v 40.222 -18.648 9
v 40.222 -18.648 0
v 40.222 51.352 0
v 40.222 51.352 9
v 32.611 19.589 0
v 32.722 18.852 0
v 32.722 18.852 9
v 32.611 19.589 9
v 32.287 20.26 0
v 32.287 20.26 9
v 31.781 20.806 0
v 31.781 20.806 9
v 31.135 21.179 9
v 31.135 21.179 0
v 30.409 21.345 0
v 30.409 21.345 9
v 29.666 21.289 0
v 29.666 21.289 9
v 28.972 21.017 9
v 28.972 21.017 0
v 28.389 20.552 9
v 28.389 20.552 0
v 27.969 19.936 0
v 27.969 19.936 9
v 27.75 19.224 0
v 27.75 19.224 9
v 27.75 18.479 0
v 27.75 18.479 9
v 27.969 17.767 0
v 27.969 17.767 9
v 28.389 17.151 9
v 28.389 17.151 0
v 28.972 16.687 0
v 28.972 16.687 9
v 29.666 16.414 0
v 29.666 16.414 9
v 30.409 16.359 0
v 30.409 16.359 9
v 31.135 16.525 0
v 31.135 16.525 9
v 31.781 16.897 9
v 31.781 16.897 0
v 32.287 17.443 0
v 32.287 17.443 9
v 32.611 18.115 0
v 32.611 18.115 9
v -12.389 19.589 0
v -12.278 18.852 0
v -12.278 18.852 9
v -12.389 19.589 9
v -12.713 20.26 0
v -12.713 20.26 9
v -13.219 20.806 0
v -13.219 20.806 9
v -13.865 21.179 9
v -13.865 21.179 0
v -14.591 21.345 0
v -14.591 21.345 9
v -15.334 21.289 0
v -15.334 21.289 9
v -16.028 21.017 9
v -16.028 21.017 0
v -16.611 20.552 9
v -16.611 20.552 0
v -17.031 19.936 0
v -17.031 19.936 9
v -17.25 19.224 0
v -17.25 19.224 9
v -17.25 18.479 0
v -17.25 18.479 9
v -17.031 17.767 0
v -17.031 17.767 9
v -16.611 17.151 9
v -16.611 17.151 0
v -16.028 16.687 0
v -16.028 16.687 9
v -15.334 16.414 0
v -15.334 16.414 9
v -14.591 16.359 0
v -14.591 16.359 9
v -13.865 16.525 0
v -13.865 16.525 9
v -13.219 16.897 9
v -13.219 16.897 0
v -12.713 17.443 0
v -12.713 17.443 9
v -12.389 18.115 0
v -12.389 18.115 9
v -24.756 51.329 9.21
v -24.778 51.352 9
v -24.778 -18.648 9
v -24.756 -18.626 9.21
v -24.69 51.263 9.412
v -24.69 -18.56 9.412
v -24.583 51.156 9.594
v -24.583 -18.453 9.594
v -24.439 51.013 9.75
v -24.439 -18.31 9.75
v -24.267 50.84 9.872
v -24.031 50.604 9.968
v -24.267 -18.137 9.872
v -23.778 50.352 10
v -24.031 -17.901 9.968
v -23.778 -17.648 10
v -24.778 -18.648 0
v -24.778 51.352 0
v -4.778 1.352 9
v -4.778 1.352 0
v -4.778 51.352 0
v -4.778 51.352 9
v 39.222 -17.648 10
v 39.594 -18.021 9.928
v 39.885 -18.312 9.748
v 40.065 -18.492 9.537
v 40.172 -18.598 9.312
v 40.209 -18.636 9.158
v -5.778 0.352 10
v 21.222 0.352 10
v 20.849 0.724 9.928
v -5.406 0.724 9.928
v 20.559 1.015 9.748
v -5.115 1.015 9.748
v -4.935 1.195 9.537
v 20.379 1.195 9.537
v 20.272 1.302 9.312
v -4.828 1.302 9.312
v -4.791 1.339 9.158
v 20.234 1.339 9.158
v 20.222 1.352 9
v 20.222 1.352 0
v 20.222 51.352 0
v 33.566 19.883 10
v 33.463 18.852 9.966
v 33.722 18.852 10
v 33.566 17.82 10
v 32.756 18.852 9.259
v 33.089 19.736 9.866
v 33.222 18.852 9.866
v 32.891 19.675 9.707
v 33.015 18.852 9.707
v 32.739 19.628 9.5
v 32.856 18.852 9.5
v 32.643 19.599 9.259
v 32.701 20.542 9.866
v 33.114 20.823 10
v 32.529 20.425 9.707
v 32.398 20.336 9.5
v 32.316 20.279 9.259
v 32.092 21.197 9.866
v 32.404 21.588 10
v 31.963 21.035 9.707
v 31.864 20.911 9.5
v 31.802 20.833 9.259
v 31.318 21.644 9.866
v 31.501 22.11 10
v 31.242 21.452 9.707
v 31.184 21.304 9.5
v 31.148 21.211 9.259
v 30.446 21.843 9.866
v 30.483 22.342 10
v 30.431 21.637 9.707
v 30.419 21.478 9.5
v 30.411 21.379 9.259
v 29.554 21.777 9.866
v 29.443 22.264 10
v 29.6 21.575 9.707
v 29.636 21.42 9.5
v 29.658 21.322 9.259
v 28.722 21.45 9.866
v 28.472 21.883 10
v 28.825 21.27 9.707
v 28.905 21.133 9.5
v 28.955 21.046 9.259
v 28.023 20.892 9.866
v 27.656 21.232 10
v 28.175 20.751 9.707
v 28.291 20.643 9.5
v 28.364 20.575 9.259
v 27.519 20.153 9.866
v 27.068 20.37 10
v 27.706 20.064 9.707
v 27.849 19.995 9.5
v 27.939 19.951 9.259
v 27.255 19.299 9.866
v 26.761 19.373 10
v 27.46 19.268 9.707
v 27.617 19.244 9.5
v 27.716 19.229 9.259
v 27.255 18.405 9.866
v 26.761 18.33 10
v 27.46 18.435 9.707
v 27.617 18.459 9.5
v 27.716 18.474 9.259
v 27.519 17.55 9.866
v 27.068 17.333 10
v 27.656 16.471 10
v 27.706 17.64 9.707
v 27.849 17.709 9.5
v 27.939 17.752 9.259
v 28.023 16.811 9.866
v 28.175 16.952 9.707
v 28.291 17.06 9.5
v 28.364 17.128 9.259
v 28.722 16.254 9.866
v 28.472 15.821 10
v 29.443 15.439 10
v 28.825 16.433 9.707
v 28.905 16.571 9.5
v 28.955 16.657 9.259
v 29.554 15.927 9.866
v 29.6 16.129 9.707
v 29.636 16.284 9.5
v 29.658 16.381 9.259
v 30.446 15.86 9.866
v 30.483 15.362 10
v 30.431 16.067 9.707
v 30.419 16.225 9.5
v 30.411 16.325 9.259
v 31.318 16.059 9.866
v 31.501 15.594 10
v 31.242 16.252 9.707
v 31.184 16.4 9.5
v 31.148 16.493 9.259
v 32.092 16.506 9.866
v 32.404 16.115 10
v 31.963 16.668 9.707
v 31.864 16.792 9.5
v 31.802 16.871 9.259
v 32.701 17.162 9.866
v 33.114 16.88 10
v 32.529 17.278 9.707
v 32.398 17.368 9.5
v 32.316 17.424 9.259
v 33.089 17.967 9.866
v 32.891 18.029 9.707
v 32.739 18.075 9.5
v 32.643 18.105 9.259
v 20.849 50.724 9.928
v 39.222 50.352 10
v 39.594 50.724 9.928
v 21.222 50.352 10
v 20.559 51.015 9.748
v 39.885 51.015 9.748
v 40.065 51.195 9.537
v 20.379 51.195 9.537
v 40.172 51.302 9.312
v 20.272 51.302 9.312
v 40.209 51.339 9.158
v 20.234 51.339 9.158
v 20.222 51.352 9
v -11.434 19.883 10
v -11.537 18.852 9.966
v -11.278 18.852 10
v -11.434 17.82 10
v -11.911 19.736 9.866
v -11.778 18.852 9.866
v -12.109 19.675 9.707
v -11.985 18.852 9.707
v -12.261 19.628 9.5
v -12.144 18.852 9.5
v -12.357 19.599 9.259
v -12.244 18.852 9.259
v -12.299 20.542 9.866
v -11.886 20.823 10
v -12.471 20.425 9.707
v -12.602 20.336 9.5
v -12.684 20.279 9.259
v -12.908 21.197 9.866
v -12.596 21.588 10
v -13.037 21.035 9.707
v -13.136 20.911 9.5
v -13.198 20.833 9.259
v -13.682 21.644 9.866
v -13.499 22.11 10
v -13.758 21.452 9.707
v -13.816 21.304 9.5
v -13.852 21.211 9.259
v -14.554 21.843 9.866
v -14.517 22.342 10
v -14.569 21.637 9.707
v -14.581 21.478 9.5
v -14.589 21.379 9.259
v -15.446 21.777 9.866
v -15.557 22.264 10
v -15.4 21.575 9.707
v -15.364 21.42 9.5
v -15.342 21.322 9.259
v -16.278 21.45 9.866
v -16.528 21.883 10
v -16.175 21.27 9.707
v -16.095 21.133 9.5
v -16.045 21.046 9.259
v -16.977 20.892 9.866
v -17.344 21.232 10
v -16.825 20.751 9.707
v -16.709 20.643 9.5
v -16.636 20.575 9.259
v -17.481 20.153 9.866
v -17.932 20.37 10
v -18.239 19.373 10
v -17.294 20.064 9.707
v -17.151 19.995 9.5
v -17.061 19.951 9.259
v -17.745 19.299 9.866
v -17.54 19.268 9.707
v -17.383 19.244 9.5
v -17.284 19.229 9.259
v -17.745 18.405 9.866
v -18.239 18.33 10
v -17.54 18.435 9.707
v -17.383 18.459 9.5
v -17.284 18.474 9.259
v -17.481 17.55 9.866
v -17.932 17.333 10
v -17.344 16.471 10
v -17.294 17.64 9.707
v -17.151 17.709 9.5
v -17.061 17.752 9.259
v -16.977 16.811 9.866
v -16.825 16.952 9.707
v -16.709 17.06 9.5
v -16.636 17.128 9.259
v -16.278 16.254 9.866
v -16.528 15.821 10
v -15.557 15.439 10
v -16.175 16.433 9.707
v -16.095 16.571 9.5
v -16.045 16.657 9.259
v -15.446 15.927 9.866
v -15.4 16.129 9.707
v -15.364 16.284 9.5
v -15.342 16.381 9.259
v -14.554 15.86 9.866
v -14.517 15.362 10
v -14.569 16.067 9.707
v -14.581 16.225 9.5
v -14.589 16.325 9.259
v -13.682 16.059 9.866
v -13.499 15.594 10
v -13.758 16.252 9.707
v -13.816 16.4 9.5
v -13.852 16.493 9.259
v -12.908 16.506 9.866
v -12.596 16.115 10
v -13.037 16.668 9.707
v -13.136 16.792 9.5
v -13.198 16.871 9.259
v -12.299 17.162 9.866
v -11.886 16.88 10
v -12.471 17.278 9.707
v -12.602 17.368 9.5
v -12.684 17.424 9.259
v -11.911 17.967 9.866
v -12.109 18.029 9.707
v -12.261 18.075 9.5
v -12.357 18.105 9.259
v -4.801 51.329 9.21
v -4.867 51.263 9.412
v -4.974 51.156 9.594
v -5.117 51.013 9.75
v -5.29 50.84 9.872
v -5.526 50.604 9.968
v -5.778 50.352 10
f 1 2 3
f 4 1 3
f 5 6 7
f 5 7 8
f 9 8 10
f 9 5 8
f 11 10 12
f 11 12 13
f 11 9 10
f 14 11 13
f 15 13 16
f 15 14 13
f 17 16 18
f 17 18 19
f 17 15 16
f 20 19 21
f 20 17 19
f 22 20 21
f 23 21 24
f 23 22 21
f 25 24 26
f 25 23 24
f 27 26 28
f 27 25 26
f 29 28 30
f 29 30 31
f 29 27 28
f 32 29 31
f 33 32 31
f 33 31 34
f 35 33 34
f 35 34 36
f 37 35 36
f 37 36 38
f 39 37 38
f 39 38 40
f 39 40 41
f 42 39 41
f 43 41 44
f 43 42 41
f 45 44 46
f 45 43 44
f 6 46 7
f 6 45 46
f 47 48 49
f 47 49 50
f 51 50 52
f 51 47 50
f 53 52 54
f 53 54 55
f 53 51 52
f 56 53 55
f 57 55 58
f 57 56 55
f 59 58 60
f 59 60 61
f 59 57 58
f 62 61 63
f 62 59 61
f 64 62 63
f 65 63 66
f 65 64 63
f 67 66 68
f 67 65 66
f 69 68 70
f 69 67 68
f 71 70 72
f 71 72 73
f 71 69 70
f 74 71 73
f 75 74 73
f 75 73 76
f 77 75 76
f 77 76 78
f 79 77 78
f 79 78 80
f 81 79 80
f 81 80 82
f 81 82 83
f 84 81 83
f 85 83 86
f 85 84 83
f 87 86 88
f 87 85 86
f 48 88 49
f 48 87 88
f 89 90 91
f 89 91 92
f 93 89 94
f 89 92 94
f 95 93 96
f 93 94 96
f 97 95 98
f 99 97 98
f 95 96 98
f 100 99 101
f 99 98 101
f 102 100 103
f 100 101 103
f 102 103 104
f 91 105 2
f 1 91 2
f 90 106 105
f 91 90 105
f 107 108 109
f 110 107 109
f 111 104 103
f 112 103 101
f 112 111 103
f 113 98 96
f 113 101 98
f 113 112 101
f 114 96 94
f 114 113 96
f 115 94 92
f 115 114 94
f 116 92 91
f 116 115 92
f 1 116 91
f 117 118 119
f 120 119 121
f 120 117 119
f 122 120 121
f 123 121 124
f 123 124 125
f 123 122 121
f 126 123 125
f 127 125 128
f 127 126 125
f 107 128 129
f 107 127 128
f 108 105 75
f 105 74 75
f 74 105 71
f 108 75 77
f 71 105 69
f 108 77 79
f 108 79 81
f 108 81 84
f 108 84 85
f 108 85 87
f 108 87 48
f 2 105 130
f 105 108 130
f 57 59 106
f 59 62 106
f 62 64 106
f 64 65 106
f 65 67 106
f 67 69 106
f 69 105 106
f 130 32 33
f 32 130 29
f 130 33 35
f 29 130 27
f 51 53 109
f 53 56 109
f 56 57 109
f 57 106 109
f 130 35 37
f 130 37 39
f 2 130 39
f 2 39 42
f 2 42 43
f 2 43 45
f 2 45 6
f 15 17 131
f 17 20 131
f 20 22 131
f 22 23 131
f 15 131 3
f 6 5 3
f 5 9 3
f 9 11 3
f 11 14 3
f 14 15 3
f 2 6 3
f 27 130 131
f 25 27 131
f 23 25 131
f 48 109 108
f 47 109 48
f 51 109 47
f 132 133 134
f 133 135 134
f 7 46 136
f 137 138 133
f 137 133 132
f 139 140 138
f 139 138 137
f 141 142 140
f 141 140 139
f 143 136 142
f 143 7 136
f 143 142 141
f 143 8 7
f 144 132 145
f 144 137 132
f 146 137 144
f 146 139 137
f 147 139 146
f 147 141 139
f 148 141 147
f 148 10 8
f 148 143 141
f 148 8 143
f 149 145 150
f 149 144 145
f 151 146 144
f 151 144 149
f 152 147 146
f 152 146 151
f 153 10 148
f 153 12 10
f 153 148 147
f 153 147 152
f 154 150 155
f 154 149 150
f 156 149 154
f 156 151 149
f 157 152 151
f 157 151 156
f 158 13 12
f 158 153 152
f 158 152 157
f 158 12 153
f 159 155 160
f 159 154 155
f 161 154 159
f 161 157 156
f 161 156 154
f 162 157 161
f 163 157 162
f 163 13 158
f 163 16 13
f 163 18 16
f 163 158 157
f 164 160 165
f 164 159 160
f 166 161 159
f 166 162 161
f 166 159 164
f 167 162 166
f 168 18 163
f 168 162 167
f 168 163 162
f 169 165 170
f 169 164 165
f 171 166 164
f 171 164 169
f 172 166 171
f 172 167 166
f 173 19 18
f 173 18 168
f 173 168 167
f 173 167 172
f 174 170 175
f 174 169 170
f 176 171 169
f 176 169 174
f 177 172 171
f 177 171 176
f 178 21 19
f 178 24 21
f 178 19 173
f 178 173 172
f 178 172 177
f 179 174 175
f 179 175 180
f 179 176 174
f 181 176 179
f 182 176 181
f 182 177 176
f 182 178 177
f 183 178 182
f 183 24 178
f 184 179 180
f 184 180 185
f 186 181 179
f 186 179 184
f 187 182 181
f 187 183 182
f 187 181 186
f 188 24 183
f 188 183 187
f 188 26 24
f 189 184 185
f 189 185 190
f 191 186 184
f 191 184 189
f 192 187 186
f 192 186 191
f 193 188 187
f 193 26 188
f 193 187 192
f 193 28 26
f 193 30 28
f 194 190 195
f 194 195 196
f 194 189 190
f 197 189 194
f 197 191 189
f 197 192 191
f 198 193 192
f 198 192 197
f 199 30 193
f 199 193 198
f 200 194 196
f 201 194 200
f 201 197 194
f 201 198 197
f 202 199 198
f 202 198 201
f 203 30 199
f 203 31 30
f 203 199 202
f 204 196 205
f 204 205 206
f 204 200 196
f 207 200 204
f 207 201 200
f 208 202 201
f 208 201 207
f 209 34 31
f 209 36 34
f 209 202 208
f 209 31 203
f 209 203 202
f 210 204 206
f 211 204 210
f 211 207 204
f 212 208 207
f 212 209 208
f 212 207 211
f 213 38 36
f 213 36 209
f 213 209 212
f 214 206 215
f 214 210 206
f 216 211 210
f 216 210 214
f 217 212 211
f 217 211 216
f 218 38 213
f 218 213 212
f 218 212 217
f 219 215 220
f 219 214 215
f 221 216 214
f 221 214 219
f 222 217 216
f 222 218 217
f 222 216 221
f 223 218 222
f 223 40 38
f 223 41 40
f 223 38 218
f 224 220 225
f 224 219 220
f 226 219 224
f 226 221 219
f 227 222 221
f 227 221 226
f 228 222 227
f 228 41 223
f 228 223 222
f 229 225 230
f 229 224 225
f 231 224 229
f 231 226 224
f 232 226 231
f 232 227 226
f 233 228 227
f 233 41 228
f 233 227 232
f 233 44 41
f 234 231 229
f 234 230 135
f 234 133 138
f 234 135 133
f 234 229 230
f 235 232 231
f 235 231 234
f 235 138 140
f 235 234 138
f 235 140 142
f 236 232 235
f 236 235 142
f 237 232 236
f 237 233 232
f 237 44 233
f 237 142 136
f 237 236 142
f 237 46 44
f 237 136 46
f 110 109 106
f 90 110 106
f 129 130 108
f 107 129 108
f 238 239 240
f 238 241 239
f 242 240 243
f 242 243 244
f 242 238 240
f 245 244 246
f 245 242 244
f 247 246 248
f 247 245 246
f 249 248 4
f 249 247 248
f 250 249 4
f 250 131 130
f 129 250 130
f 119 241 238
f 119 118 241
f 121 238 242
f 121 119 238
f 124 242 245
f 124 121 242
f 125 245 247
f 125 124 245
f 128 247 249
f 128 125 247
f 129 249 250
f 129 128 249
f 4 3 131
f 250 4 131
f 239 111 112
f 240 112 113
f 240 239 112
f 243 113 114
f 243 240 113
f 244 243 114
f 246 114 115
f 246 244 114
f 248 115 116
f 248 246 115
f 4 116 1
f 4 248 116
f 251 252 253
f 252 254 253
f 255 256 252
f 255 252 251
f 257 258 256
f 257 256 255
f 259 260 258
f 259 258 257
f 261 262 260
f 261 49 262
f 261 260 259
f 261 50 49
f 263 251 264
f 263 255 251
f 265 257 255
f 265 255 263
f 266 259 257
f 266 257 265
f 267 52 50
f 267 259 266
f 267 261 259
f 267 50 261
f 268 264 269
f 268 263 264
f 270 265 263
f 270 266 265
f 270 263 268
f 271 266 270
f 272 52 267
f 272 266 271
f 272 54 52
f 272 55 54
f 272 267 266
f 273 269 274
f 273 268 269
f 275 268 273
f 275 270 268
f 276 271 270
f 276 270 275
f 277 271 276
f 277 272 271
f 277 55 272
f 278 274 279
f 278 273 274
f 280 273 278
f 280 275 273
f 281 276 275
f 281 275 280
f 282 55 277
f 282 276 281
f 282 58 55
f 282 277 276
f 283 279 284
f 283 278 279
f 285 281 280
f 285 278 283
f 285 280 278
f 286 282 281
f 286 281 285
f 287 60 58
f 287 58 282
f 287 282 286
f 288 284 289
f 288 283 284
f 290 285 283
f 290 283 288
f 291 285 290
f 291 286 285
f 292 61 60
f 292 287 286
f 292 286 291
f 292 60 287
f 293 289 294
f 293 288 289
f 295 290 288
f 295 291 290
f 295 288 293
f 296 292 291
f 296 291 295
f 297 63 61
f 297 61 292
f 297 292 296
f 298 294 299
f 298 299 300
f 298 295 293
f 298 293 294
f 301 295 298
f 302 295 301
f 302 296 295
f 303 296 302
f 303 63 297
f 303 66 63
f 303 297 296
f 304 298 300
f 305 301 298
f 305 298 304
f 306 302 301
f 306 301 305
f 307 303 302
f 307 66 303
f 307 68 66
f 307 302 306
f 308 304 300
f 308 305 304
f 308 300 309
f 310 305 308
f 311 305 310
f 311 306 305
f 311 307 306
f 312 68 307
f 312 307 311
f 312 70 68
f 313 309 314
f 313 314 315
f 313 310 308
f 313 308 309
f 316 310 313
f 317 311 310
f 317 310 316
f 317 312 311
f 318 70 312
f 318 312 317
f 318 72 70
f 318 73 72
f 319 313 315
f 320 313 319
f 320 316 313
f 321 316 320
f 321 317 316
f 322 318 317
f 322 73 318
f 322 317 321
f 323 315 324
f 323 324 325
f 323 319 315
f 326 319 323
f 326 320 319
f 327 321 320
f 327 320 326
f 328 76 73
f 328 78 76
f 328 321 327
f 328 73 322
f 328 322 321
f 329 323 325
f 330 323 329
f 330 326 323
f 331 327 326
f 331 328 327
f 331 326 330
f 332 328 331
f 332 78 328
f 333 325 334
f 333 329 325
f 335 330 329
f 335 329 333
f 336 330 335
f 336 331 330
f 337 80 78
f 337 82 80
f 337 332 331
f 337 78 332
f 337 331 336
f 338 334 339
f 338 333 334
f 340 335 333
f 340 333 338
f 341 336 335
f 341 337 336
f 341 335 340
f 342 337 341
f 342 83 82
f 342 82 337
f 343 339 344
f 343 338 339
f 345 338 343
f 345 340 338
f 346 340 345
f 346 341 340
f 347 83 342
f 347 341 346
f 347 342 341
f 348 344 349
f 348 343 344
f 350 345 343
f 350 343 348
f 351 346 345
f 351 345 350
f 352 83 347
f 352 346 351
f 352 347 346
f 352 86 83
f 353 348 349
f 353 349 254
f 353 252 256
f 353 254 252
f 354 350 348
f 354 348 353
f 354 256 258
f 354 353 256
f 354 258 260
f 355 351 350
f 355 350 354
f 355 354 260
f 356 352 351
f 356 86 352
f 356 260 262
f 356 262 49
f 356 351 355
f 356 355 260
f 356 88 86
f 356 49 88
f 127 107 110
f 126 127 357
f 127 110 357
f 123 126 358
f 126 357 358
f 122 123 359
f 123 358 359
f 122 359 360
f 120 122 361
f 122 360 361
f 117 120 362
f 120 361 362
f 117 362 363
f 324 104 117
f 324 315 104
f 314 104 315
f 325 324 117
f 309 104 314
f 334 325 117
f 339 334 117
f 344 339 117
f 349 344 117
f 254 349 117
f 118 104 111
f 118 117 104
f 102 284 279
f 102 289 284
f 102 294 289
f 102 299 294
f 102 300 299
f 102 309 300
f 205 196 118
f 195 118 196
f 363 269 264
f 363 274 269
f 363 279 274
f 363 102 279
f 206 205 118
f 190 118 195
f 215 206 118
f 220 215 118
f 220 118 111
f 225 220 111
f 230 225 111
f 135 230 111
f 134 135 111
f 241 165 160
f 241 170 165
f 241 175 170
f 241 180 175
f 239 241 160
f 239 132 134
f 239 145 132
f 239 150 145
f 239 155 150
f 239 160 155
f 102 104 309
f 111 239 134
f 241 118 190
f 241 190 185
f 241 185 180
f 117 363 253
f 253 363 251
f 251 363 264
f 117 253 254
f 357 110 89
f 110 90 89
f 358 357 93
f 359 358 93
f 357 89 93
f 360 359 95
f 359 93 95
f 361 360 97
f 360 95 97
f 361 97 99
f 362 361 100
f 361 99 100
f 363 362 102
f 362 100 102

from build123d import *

# Parameters (mm, degrees)
F0_R     = 2.5
F1_DEPTH = 10
F2_DEPTH = 10
F3_R     = 1


with BuildPart() as f1:
    # F0 (on Top) → F1 (new body)
    with BuildSketch(Plane.XY):
        Polygon((-4.778127, 51.351744), (-24.778127, 51.351744), (-24.778127, -18.648256), (40.221873, -18.648256), (40.221873, 51.351744), (20.221873, 51.351744), (20.221873, 1.351744), (-4.778127, 1.351744), align=None)
        with Locations((-14.778127, 18.851744)):
            Circle(F0_R, mode=Mode.SUBTRACT)
        with Locations((30.221873, 18.851744)):
            Circle(F0_R, mode=Mode.SUBTRACT)
    extrude(amount=F1_DEPTH)

    # F0 (on Top) → F2 (join)
    with BuildSketch(Plane.XY):
        Polygon((-4.778127, 51.351744), (-24.778127, 51.351744), (-24.778127, -18.648256), (40.221873, -18.648256), (40.221873, 51.351744), (20.221873, 51.351744), (20.221873, 1.351744), (-4.778127, 1.351744), align=None)
        with Locations((-14.778127, 18.851744)):
            Circle(F0_R, mode=Mode.SUBTRACT)
        with Locations((30.221873, 18.851744)):
            Circle(F0_R, mode=Mode.SUBTRACT)
    extrude(amount=F2_DEPTH)

    # F3
    f3_edges = [f1.edges().sort_by_distance(p)[0] for p in [
        (-14.778127, 51.351744, 10),
        (-24.778127, 16.351744, 10),
        (7.721873, -18.648256, 10),
        (40.221873, 16.351744, 10),
        (30.221873, 51.351744, 10),
        (20.221873, 26.351744, 10),
        (7.721873, 1.351744, 10),
        (-4.778127, 26.351744, 10),
        (-17.278127, 18.851744, 10),
        (27.721873, 18.851744, 10),
    ]]
    fillet(f3_edges, radius=F3_R)


solid = f1.part
